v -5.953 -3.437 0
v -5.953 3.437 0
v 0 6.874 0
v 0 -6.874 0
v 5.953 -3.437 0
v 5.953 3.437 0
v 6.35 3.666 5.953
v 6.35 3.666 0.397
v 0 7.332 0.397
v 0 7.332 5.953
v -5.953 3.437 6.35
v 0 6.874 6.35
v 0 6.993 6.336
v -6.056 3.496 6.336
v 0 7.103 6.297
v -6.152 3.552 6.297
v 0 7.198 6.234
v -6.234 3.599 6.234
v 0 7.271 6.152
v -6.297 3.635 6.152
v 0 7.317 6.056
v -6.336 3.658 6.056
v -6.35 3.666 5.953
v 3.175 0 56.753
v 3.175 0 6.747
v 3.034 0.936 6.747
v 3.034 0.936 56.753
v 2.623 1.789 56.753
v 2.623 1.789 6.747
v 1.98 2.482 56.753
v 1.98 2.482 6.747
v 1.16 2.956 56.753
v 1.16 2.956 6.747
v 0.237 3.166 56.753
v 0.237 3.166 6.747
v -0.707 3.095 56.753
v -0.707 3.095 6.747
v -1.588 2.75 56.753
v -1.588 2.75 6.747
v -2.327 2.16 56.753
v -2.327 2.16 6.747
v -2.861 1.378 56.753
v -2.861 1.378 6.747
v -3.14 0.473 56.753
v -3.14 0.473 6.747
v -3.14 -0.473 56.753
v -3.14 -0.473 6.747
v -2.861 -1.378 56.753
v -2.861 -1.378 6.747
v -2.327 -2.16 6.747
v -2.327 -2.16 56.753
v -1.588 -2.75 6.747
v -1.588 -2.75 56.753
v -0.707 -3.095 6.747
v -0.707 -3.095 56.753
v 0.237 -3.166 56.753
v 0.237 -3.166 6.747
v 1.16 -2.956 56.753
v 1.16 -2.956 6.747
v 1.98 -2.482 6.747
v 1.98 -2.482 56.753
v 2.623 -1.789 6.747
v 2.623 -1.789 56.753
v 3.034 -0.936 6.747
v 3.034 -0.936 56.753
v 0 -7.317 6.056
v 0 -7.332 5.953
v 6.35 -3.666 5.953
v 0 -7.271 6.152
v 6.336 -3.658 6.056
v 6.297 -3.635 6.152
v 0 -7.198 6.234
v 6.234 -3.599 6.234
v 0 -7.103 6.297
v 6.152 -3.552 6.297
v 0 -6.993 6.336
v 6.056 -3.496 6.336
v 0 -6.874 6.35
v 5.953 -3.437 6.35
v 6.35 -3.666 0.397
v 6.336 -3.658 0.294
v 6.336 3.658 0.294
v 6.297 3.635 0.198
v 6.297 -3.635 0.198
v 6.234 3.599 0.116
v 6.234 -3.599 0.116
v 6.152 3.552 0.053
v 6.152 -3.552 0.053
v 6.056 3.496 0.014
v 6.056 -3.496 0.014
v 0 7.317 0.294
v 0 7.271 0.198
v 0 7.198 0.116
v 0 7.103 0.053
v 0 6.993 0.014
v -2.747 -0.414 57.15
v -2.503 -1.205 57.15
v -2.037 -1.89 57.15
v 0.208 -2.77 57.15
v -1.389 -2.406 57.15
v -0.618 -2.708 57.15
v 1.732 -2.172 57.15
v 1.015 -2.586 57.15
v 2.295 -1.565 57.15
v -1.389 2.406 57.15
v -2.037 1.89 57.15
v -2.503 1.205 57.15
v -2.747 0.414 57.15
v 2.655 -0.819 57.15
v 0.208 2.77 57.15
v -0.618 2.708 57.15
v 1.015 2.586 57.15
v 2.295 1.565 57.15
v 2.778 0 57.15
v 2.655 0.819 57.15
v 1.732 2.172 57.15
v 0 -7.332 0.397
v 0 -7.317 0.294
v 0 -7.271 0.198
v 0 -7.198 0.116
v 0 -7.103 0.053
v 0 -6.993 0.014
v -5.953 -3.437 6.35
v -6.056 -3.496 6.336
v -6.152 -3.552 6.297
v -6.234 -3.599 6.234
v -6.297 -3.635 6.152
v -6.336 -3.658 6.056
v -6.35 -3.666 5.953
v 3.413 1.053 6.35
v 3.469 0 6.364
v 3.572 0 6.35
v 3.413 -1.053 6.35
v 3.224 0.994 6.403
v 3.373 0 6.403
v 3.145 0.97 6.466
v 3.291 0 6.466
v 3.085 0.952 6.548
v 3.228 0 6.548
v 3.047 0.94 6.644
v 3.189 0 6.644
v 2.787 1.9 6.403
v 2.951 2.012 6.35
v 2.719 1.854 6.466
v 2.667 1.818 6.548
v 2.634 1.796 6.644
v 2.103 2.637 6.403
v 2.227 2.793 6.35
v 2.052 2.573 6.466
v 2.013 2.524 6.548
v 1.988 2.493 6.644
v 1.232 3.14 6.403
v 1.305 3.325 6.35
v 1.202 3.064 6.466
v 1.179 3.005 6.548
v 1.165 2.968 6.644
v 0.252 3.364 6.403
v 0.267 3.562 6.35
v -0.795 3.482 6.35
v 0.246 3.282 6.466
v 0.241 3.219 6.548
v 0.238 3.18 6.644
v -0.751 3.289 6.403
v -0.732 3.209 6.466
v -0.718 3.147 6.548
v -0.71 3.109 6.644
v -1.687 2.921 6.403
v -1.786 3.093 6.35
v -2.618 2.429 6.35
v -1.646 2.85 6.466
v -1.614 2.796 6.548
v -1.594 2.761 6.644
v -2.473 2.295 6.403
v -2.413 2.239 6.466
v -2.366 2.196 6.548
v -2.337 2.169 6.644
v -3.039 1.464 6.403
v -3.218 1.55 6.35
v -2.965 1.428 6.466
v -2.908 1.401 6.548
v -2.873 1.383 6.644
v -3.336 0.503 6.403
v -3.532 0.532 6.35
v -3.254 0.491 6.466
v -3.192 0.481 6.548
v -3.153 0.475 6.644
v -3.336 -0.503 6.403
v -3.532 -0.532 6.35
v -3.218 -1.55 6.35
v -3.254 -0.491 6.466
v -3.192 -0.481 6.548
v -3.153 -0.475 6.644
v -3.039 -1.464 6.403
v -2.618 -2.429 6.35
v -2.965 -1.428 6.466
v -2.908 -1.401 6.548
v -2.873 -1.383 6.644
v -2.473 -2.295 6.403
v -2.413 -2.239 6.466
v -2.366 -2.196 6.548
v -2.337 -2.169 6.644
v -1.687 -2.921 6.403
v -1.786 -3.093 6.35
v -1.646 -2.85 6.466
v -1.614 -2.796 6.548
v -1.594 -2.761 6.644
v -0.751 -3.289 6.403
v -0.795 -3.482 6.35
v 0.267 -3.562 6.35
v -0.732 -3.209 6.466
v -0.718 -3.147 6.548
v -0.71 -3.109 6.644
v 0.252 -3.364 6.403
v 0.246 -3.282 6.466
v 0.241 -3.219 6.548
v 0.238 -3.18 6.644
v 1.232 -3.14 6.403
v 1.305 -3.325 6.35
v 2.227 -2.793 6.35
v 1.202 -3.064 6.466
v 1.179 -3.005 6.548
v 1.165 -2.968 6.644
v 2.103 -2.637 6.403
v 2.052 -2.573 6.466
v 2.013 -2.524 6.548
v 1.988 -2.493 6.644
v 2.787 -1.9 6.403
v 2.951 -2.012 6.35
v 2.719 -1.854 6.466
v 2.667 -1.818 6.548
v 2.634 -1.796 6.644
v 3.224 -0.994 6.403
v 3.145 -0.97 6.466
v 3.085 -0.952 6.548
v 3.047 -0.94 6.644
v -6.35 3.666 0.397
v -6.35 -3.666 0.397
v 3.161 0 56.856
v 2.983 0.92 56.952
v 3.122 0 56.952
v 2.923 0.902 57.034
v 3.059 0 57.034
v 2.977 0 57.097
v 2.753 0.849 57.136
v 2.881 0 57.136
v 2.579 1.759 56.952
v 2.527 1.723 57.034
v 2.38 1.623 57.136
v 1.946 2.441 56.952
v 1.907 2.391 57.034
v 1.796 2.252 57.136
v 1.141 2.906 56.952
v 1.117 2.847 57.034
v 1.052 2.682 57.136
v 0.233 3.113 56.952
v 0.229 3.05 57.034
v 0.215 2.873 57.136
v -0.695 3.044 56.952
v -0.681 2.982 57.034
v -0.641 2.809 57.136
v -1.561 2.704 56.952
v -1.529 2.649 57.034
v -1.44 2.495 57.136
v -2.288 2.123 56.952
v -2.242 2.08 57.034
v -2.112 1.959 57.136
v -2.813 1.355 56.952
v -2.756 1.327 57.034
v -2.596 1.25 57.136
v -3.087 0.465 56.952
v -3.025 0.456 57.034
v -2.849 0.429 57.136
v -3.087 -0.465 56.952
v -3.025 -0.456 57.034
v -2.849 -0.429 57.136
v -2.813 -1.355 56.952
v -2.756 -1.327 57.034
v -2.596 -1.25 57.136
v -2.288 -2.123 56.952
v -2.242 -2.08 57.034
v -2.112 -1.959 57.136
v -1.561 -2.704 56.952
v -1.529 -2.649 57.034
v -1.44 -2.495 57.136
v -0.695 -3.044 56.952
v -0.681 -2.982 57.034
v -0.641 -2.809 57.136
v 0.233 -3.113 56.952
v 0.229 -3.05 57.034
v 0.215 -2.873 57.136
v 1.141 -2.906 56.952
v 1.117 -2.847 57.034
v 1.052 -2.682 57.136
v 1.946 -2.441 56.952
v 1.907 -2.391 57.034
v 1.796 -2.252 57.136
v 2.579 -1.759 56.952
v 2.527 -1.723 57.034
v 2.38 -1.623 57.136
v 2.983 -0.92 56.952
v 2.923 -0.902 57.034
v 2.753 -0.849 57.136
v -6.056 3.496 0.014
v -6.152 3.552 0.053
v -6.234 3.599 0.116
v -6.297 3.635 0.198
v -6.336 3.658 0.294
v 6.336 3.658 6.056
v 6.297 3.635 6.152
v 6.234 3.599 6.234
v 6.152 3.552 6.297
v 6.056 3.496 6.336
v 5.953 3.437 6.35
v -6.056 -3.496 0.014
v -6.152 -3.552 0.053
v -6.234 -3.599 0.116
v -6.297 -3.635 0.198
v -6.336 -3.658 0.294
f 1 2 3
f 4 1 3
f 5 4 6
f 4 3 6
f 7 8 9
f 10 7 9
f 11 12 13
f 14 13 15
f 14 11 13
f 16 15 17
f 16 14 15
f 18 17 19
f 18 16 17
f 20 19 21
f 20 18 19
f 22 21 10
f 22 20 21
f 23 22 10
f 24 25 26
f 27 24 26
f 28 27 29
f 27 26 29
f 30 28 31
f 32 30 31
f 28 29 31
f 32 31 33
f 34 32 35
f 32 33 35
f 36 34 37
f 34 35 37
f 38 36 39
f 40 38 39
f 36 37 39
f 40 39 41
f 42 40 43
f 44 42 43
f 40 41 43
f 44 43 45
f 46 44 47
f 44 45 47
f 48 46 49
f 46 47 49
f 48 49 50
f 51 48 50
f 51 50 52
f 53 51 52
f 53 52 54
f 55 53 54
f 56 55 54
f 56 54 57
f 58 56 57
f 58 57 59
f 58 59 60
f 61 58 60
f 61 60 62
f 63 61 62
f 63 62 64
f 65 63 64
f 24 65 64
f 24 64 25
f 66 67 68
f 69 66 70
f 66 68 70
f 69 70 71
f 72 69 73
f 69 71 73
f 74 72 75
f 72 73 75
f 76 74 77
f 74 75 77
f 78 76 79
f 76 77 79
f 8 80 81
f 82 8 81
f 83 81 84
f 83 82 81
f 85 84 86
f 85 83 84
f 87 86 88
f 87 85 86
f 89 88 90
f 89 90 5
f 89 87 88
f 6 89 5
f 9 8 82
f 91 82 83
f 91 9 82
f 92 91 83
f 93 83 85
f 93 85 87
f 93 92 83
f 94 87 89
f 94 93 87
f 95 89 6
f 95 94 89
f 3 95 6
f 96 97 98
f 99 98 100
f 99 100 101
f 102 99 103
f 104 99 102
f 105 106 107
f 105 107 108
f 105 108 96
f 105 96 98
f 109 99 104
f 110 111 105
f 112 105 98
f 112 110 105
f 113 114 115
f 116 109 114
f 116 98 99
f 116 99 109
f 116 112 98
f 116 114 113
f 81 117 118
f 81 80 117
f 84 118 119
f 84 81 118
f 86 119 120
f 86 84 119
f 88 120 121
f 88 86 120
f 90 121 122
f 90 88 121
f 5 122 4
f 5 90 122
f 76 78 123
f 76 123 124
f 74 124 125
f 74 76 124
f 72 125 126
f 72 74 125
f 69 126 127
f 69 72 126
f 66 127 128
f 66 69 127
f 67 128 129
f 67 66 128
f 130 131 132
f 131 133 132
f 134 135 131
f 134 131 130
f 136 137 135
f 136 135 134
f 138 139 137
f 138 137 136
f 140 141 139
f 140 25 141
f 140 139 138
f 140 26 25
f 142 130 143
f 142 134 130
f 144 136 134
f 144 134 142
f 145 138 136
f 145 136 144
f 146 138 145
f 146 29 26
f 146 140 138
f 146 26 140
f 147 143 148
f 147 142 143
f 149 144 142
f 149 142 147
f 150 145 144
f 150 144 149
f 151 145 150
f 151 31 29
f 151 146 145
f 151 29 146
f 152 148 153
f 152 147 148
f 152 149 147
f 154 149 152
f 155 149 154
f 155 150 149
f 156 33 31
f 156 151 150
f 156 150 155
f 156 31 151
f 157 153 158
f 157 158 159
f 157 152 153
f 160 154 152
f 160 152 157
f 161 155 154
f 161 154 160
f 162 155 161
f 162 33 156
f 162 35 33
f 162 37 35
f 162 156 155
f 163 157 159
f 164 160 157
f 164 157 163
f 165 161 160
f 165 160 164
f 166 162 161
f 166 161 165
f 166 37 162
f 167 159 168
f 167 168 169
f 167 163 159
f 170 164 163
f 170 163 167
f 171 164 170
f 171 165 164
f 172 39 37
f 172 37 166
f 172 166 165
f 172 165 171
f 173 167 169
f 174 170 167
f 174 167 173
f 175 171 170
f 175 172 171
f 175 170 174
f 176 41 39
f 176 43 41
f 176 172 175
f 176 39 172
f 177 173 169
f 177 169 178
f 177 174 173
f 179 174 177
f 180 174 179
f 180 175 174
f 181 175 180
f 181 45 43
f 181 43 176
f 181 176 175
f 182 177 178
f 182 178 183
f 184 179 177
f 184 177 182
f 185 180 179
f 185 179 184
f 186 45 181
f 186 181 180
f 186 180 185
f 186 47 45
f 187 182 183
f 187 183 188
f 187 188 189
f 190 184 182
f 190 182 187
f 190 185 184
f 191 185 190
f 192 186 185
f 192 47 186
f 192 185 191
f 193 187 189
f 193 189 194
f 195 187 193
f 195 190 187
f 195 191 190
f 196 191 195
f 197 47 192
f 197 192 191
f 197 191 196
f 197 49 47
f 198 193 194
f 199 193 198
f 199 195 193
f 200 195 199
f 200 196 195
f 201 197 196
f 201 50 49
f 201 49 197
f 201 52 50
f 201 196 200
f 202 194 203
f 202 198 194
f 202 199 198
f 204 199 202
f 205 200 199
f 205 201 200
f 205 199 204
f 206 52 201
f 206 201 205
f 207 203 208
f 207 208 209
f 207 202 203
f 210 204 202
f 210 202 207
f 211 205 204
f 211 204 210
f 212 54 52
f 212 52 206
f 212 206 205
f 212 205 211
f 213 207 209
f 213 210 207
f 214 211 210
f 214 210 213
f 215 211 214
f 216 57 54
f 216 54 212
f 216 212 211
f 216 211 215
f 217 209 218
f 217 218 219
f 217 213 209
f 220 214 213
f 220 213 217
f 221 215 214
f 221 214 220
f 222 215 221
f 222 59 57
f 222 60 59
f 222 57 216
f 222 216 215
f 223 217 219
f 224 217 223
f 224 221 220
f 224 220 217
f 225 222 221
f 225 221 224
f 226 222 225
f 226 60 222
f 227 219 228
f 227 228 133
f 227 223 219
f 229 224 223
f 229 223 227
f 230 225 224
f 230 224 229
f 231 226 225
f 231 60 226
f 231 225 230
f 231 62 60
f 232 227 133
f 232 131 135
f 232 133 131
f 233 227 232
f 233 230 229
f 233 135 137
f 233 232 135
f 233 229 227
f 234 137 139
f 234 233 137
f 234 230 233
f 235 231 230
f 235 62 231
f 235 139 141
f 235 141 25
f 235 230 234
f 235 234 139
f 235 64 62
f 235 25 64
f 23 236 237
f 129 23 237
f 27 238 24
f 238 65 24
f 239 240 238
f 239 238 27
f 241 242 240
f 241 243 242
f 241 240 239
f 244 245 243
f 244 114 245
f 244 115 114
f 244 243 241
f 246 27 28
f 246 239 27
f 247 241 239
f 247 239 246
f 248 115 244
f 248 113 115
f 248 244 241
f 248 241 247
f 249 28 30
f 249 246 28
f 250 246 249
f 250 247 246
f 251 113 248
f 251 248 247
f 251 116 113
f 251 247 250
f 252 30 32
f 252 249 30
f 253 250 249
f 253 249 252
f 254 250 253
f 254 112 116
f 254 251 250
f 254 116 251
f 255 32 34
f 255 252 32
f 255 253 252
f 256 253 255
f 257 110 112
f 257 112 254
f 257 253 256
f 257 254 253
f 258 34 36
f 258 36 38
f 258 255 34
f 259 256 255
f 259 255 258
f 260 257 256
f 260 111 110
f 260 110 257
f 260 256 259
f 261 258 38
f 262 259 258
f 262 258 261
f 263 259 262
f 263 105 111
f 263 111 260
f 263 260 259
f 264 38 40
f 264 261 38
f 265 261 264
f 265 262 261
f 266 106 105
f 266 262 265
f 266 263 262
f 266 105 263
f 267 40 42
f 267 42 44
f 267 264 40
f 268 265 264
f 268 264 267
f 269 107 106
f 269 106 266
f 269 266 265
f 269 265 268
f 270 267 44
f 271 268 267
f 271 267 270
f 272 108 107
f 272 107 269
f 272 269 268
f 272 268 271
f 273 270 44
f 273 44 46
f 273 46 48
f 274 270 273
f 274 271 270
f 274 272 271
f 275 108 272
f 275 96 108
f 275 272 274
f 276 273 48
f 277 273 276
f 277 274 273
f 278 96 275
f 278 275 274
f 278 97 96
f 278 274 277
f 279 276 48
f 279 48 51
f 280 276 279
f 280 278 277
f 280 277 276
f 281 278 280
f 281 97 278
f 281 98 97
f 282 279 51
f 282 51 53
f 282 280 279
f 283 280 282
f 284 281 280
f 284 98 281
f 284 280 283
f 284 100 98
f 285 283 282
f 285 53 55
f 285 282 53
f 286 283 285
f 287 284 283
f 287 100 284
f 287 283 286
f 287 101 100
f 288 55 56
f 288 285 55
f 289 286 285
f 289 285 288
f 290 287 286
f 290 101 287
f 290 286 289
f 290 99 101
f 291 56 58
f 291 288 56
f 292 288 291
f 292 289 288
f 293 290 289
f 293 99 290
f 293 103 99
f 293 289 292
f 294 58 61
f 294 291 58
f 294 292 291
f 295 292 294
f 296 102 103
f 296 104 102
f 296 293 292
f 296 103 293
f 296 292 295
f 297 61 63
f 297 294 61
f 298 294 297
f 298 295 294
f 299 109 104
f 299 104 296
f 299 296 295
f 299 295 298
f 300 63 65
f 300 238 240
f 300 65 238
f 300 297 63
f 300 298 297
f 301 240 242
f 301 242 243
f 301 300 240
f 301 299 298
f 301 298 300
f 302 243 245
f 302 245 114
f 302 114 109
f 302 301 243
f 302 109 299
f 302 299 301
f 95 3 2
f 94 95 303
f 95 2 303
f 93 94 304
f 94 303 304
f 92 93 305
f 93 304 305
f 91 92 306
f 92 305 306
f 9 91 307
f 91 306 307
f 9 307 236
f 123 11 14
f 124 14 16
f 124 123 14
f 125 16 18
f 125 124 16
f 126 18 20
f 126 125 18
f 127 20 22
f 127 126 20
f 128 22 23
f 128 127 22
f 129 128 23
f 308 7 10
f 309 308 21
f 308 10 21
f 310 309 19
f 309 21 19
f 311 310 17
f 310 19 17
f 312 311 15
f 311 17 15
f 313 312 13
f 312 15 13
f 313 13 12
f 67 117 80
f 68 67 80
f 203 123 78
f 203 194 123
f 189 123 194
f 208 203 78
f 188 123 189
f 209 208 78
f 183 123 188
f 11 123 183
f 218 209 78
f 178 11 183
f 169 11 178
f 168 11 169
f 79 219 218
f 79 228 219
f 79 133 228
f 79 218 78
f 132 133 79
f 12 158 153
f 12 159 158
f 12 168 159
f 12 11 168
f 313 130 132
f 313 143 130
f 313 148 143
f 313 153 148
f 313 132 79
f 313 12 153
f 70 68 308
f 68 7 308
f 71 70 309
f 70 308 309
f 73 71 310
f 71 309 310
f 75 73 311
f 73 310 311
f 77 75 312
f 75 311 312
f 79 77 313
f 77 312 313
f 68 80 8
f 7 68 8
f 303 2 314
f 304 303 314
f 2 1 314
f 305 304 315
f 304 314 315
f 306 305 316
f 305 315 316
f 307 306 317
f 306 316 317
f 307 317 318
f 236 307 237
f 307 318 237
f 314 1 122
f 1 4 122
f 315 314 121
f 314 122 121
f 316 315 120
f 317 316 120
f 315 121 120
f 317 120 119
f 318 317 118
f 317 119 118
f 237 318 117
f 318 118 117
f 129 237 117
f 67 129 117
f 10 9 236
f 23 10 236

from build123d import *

# Parameters (mm, degrees)
F0_R     = 3.175
F1_DEPTH = 57.15
F2_DEPTH = 6.35
F3_R     = 0.396875


with BuildPart() as f1:
    # F0 (on Top) → F1 (new body)
    with BuildSketch(Plane.XY):
        Circle(F0_R)
    extrude(amount=F1_DEPTH)

    # F0 (on Top) → F2 (join)
    with BuildSketch(Plane.XY):
        Polygon((6.35, -3.6661742094), (6.35, 3.6661742094), (0, 7.3323484187), (-6.35, 3.6661742094), (-6.35, -3.6661742094), (0, -7.3323484187), align=None)
        Circle(F0_R, mode=Mode.SUBTRACT)
    extrude(amount=F2_DEPTH)

    # F3
    f3_edges = [f1.edges().sort_by_distance(p)[0] for p in [
        (6.35, 0, 6.35),
        (3.175, 5.499261, 6.35),
        (-3.175, 5.499261, 6.35),
        (-6.35, 0, 6.35),
        (-3.175, -5.499261, 6.35),
        (3.175, -5.499261, 6.35),
        (-3.175, 0, 6.35),
        (6.35, 0, 0),
        (3.175, 5.499261, 0),
        (-3.175, 5.499261, 0),
        (-6.35, 0, 0),
        (-3.175, -5.499261, 0),
        (3.175, -5.499261, 0),
        (-3.175, 0, 57.15),
    ]]
    fillet(f3_edges, radius=F3_R)


solid = f1.part
